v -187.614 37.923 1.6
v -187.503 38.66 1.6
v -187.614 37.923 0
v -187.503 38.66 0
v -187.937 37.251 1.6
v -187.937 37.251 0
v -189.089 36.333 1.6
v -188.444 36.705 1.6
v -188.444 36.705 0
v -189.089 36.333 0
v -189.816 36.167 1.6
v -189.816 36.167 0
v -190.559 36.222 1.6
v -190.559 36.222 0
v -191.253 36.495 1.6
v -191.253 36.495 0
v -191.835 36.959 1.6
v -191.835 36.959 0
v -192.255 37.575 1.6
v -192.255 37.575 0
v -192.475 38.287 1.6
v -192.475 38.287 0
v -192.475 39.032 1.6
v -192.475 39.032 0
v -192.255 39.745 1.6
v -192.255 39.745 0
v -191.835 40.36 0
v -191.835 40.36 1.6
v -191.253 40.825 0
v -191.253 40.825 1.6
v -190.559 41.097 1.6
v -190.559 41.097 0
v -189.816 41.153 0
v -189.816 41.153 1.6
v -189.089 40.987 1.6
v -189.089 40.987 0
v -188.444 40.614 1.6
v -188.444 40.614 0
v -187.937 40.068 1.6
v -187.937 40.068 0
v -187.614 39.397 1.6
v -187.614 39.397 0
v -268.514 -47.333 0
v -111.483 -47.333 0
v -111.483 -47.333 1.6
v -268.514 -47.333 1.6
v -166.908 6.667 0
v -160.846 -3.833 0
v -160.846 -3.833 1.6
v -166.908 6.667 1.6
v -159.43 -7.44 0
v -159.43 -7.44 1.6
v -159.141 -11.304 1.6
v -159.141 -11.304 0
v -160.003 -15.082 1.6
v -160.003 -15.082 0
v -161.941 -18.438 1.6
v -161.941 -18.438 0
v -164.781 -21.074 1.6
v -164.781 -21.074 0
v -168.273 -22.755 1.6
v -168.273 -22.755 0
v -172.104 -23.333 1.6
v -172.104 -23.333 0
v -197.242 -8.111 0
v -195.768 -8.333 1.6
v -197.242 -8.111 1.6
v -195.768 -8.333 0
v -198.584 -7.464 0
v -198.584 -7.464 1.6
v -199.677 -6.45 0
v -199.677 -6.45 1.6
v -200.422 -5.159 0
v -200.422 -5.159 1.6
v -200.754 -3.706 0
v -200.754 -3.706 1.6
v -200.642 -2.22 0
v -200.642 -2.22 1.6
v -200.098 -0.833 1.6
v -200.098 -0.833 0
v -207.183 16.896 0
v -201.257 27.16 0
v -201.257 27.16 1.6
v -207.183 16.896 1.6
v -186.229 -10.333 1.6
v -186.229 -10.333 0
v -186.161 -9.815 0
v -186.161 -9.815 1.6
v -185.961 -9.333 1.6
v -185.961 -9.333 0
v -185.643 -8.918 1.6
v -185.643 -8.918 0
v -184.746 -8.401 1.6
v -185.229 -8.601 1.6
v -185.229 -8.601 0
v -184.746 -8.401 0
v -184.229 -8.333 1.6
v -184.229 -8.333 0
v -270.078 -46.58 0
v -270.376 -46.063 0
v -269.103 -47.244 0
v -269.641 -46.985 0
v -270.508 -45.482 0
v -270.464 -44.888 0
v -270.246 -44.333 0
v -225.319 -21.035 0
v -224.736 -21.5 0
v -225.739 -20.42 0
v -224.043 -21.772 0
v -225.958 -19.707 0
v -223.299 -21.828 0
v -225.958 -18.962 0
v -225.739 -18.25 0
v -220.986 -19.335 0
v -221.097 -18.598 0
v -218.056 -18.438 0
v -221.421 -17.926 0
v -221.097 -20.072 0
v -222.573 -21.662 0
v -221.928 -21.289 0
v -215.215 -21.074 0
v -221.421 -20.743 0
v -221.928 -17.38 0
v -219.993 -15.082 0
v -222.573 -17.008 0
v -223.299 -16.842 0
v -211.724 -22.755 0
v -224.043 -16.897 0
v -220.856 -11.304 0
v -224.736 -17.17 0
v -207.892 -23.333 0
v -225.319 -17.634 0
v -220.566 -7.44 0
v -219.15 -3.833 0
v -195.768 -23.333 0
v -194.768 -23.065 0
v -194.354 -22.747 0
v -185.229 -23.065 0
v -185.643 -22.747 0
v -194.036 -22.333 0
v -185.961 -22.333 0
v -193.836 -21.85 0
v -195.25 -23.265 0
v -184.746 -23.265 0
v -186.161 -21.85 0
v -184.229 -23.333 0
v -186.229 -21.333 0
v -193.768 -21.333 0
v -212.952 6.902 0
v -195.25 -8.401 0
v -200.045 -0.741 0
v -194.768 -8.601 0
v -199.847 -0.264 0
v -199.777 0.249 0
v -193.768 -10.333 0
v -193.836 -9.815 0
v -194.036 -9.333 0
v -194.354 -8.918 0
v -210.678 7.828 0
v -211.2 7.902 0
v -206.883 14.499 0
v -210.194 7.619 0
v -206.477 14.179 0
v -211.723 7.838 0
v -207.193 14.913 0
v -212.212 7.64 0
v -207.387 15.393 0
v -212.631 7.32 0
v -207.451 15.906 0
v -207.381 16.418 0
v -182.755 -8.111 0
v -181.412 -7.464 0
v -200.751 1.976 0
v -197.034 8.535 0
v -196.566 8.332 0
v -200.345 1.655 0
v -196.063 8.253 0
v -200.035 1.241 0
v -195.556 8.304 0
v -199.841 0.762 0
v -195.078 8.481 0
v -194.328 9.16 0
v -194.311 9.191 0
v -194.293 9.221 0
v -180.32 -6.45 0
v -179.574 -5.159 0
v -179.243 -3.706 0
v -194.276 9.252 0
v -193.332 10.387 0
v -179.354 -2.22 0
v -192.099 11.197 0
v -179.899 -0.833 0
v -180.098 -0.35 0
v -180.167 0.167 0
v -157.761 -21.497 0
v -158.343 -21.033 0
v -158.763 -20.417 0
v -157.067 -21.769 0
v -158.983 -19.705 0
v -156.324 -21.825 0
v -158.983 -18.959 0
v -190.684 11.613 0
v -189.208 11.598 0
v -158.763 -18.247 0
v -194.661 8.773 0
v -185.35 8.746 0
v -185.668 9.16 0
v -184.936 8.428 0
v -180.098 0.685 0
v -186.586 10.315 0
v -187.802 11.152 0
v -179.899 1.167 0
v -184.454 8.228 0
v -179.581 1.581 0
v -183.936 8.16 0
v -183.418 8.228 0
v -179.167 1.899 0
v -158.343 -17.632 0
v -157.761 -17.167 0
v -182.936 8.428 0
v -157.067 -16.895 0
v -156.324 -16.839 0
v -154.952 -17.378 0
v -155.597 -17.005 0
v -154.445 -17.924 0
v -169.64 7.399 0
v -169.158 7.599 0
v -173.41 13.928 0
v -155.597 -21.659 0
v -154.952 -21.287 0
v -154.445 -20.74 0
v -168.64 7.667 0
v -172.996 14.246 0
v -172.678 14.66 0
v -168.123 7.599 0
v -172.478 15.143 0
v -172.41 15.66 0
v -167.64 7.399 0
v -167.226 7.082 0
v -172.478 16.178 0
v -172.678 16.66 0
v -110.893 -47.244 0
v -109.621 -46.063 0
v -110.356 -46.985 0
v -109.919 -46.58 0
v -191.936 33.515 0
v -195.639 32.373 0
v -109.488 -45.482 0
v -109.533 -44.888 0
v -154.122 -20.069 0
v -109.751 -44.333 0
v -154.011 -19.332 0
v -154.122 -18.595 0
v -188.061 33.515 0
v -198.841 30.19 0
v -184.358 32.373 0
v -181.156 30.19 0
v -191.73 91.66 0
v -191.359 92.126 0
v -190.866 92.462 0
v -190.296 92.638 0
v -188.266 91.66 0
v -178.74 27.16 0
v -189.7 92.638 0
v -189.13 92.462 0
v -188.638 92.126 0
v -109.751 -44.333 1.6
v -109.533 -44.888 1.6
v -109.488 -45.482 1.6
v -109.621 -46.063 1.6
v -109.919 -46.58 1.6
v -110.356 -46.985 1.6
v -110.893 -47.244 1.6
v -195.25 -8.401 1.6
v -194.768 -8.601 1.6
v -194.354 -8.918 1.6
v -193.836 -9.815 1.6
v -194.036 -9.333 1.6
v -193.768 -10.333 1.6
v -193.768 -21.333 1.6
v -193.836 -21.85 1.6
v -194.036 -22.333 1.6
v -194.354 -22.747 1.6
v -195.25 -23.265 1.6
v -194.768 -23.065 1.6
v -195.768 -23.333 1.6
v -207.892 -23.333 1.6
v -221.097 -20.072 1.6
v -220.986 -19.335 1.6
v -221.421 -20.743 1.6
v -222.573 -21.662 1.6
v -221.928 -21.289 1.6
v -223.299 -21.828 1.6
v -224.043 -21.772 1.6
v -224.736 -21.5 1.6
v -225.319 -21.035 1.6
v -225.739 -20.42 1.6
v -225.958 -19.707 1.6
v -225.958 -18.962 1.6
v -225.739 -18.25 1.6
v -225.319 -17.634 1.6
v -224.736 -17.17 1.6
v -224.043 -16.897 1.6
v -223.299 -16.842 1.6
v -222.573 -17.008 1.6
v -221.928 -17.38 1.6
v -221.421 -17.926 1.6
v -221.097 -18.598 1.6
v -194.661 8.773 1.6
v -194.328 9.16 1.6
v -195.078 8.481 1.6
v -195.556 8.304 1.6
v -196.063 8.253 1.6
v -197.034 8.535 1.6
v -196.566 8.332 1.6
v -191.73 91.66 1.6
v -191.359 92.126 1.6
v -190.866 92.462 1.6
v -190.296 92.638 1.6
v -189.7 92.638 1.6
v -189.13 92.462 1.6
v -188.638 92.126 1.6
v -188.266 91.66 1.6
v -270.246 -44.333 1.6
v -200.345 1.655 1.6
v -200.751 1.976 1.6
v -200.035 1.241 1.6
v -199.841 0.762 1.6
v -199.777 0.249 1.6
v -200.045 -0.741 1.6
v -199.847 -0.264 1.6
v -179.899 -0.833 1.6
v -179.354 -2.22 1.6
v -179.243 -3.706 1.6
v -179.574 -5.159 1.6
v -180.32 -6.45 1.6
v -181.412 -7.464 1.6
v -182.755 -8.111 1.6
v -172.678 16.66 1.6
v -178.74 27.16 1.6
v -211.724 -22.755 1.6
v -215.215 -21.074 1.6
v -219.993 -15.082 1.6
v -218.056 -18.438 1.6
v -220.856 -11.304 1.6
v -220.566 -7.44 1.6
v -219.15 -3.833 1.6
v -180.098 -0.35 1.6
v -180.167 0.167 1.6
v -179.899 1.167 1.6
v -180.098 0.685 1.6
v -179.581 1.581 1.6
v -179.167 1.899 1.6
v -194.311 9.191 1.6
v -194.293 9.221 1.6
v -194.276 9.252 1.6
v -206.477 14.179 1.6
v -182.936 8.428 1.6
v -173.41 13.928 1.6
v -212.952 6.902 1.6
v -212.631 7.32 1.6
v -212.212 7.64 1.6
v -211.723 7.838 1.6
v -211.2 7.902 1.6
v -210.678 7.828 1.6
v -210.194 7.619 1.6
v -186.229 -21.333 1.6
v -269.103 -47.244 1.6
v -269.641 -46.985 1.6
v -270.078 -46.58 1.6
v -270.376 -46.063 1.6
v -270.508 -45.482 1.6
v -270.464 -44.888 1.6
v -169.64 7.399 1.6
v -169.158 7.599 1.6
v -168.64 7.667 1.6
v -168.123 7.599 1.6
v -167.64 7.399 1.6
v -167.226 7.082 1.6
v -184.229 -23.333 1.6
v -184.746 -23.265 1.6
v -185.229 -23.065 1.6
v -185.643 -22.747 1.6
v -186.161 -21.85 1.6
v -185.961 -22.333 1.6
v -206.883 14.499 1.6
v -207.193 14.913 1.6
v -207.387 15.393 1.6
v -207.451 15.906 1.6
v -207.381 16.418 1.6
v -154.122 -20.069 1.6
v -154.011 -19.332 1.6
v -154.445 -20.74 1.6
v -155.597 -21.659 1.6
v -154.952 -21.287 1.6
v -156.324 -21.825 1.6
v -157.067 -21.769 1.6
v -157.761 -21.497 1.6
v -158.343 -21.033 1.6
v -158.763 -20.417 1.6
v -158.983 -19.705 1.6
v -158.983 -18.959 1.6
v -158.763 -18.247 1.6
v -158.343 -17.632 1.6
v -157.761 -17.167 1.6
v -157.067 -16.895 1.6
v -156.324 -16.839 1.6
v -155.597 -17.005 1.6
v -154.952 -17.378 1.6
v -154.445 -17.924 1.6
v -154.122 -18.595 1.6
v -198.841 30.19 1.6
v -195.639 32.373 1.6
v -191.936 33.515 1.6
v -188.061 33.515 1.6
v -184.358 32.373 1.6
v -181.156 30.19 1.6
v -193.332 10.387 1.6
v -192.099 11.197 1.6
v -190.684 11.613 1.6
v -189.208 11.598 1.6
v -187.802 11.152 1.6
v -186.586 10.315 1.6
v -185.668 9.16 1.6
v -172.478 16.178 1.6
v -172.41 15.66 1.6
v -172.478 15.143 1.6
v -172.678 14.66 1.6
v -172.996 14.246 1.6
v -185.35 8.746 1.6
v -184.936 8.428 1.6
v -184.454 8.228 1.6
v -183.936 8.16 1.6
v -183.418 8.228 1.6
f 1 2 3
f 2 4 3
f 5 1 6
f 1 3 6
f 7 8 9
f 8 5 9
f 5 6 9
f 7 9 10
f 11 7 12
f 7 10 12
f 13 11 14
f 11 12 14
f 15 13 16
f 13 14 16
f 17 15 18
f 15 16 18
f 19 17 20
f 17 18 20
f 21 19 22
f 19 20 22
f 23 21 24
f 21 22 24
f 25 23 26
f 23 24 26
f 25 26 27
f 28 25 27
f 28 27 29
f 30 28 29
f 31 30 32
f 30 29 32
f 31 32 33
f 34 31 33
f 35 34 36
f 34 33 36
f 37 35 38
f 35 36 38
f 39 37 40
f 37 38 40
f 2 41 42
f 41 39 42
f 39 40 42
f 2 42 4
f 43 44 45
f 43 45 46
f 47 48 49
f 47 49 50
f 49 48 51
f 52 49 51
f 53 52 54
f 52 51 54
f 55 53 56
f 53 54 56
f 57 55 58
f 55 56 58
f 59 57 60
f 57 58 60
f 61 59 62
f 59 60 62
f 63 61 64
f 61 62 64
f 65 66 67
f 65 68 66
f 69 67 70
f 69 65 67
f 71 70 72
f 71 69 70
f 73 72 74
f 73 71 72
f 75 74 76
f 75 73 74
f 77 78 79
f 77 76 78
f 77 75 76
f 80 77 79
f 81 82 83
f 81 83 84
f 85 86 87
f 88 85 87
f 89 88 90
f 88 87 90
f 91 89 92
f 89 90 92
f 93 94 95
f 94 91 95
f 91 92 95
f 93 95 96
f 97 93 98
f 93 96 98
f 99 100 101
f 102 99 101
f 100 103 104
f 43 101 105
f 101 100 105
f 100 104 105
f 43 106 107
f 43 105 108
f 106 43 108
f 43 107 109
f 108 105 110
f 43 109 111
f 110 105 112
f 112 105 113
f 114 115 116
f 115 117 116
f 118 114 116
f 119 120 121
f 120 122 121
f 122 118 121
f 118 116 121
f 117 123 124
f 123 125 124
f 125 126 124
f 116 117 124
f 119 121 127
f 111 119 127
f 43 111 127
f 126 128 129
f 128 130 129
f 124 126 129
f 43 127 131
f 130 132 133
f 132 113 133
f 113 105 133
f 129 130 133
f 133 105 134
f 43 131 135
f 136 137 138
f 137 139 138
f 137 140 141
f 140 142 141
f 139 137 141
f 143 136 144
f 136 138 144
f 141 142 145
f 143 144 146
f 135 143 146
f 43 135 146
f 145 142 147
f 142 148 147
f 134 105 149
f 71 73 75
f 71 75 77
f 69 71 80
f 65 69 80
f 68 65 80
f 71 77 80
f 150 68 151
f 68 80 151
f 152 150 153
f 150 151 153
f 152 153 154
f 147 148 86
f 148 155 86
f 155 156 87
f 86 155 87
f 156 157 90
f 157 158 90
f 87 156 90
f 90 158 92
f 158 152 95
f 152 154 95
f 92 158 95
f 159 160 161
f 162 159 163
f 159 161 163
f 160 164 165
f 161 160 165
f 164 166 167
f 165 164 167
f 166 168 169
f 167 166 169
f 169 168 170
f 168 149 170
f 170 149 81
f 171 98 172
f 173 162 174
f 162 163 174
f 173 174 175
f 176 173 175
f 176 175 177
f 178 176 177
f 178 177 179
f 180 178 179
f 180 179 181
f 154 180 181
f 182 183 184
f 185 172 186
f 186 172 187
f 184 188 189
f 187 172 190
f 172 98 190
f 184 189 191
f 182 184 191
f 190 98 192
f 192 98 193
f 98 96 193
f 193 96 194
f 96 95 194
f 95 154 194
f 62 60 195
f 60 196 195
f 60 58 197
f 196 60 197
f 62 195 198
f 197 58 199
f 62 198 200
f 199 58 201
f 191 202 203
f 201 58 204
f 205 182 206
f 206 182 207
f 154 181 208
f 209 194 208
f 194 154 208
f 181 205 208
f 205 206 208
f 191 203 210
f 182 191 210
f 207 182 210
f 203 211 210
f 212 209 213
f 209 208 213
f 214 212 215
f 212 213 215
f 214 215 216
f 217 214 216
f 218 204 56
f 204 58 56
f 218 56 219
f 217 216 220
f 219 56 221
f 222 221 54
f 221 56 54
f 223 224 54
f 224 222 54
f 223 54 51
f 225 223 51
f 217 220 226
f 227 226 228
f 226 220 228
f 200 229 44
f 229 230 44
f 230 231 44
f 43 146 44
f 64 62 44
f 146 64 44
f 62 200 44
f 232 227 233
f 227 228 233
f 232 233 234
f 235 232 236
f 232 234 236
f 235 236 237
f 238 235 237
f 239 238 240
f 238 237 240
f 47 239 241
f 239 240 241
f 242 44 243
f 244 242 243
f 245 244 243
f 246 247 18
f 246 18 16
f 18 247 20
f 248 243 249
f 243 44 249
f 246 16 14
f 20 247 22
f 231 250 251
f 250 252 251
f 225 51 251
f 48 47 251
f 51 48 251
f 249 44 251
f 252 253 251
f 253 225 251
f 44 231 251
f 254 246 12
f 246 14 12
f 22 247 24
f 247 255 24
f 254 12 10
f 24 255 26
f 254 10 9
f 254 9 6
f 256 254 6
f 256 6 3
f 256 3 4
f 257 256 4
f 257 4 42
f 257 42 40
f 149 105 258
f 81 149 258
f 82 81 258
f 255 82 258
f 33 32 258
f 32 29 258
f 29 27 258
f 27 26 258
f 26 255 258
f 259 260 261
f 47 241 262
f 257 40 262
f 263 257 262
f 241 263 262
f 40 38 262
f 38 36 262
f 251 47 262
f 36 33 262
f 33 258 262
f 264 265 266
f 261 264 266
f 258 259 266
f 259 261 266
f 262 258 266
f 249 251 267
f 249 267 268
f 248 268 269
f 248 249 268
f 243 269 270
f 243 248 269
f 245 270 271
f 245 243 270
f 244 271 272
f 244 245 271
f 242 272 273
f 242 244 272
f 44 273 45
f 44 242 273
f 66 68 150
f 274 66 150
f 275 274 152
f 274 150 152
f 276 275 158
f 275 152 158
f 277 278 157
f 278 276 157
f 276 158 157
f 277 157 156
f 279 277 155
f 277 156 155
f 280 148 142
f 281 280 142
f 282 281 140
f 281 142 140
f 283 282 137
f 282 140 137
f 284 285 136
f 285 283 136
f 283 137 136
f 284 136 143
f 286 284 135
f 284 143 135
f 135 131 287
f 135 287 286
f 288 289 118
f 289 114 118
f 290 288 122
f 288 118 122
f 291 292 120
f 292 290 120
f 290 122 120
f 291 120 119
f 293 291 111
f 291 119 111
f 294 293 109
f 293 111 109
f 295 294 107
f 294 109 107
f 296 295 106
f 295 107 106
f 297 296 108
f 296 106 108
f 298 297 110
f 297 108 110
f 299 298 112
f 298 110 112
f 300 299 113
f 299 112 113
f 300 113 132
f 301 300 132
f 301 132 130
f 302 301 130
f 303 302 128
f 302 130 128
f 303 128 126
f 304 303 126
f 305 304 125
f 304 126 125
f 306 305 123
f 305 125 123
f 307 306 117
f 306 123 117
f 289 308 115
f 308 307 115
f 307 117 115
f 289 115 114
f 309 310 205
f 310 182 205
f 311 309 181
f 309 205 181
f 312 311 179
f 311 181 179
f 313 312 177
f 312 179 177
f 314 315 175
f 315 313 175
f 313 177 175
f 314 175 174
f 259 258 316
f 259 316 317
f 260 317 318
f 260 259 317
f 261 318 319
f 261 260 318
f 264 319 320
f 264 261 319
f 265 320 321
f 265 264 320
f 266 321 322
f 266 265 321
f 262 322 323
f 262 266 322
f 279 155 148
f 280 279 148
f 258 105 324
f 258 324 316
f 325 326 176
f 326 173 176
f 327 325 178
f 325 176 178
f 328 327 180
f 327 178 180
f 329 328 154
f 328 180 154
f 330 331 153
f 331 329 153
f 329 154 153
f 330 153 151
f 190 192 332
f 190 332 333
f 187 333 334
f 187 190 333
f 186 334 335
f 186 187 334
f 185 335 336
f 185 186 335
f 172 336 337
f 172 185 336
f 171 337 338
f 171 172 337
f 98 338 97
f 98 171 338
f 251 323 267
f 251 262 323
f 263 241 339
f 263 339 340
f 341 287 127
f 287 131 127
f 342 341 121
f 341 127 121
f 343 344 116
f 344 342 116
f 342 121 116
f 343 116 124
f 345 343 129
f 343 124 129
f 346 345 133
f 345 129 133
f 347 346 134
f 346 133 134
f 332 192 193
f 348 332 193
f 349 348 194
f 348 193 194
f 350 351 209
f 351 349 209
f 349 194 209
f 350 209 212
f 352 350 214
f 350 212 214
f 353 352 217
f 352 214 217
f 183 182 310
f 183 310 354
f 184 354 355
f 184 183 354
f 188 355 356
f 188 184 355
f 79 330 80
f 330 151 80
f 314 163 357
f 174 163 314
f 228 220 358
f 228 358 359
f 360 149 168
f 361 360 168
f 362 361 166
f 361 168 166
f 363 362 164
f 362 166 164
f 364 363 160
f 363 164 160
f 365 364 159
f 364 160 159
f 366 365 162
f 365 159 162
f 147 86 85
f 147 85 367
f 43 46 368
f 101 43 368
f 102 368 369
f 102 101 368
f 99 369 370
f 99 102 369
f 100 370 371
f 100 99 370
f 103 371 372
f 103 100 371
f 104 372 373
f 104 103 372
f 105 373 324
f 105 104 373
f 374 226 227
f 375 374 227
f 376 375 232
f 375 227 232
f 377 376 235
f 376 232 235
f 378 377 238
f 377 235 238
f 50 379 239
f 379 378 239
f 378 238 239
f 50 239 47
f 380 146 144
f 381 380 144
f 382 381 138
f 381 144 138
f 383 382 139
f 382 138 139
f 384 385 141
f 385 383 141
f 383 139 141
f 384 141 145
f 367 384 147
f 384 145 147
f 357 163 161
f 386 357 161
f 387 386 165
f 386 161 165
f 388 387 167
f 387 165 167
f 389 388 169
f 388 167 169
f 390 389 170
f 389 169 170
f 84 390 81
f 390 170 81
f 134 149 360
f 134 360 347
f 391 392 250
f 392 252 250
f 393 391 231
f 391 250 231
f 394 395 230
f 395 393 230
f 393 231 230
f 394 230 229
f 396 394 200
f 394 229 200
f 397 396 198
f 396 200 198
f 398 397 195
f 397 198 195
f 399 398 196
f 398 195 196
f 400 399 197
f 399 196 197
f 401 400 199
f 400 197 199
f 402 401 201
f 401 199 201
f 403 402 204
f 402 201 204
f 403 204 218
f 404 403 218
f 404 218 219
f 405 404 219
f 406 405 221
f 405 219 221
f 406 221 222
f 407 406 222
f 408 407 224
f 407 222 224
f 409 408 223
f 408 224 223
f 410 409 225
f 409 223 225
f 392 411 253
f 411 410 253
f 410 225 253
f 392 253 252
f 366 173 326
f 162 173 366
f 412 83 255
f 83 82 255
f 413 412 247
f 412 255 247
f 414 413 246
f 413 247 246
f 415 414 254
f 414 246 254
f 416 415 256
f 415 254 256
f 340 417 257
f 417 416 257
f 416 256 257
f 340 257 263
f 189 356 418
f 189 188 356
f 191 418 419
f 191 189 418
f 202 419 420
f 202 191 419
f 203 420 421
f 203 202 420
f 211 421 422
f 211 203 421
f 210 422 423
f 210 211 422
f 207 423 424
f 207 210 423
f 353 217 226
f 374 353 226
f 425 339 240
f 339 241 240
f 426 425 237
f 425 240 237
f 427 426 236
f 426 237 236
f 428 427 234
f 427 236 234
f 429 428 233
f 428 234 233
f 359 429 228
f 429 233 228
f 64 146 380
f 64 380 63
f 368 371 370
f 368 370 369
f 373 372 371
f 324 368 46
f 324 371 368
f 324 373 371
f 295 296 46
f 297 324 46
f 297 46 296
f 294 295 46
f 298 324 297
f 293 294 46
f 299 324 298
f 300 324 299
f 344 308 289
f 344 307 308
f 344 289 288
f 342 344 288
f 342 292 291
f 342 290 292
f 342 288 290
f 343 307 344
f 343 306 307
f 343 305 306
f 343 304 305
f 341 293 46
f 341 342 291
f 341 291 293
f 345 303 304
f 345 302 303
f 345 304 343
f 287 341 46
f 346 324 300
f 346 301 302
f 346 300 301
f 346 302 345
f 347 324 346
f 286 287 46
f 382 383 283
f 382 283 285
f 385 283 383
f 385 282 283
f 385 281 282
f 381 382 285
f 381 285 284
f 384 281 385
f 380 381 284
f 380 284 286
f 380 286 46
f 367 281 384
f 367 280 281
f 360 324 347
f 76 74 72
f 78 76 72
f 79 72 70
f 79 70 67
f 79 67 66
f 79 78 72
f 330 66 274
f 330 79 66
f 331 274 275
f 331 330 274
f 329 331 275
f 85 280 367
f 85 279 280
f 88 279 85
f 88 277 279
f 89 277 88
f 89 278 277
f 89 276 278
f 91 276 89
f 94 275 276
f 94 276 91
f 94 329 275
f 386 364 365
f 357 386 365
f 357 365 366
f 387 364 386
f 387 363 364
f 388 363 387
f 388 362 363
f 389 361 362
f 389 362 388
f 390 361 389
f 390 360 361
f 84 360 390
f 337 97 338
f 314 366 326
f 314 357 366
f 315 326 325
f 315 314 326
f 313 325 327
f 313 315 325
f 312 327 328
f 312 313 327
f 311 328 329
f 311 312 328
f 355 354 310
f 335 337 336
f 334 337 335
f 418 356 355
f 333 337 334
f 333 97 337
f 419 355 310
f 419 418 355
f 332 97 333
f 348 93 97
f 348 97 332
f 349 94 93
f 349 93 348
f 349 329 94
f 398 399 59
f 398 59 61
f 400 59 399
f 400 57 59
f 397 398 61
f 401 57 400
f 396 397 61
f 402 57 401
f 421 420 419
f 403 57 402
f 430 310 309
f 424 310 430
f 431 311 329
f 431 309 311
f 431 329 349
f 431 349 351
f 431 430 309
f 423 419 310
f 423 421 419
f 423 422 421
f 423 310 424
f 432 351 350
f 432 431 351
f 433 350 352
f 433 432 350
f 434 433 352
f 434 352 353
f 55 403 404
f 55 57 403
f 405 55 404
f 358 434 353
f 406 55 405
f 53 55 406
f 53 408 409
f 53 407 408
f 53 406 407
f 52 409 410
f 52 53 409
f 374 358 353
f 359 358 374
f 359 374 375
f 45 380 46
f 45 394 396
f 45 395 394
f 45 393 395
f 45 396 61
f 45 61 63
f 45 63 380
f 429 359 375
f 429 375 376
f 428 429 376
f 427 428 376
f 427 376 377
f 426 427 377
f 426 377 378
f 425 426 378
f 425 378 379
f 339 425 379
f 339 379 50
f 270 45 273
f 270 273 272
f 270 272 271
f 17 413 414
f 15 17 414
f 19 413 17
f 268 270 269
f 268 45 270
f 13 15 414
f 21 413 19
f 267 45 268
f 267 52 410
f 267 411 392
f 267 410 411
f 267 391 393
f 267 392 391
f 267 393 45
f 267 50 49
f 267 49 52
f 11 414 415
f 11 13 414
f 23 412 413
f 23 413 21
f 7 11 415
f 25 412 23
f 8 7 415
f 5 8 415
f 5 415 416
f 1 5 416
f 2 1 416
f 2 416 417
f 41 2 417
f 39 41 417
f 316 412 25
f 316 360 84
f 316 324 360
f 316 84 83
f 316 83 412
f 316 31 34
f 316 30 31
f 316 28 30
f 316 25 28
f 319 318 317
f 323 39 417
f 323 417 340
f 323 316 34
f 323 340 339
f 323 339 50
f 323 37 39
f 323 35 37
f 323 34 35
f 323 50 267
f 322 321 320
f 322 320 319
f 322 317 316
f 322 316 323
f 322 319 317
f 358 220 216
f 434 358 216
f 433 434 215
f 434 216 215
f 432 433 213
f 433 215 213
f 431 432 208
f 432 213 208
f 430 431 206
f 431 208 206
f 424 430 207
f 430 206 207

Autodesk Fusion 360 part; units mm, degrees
sketch "Sketch1" plane through (0, 0, 0) normal (0, 0, 1) x (1, 0, 0)
  circle A0 centre (-190.0028, 38.6598) radius 2.5
  circle A1 centre (-223.4863, -19.3348) radius 2.5
  circle A2 centre (-156.5107, -19.3321) radius 2.5
  line L0 (-270.2459, -44.3327) -> (-191.7303, 91.6603)
  line L1 (-188.2662, 91.6603) -> (-109.7506, -44.3327)
  line L2 (-111.4826, -47.3327) -> (-268.5139, -47.3327)
  line L3 (-274.0245, -46.8774) -> (-272.6069, -49.3327)
  line L4 (-274.0245, -46.8774) -> (-191.4162, 96.2043)
  line L5 (-188.5801, 96.204) -> (-191.4221, 96.204)
  line L6 (-107.3967, -49.3327) -> (-105.9755, -46.8713)
  line L7 (-107.3967, -49.3327) -> (-272.6069, -49.3327)
  line L8 (-188.5801, 96.204) -> (-105.9755, -46.8713)
  arc A3 (-270.2459, -44.3327) -> (-268.5139, -47.3327) centre (-268.5139, -45.3327) ccw
  arc A4 (-188.2662, 91.6603) -> (-191.7303, 91.6603) centre (-189.9983, 90.6603) ccw
  arc A5 (-111.4826, -47.3327) -> (-109.7506, -44.3327) centre (-111.4826, -45.3327) ccw
  arc A6 (-219.1504, -3.8327) -> (-207.8921, -23.3327) centre (-207.8921, -10.3327) ccw
  arc A7 (-178.7399, 27.1603) -> (-201.2566, 27.1603) centre (-189.9983, 20.6603) ccw
  arc A8 (-172.1044, -23.3327) -> (-160.8461, -3.8327) centre (-172.1044, -10.3327) ccw
  arc A9 (-185.6681, 9.1603) -> (-194.3284, 9.1603) centre (-189.9983, 6.6603) ccw
  arc A10 (-200.0979, -0.8327) -> (-195.7678, -8.3327) centre (-195.7678, -3.3327) ccw
  arc A11 (-184.2287, -8.3327) -> (-179.8986, -0.8327) centre (-184.2287, -3.3327) ccw
  line L9 (-182.9361, 8.4283) -> (-173.4098, 13.9283)
  line L10 (-179.1666, 1.8993) -> (-169.6403, 7.3993)
  line L11 (-206.4769, 14.1788) -> (-197.0336, 8.5351)
  line L12 (-200.7511, 1.9755) -> (-210.1943, 7.6193)
  line L13 (-186.2287, -10.3327) -> (-186.2287, -21.3327)
  line L14 (-193.7678, -10.3327) -> (-193.7678, -21.3327)
  line L15 (-194.3284, 9.1603) -> (-194.2756, 9.2518)
  line L16 (-200.0451, -0.7412) -> (-200.0979, -0.8327)
  line L17 (-207.8921, -23.3327) -> (-195.7678, -23.3327)
  line L18 (-184.2287, -23.3327) -> (-172.1044, -23.3327)
  line L19 (-201.2566, 27.1603) -> (-207.1829, 16.8956)
  line L20 (-212.9524, 6.9025) -> (-219.1504, -3.8327)
  line L21 (-160.8461, -3.8327) -> (-166.9082, 6.6673)
  line L22 (-172.6777, 16.6603) -> (-178.7399, 27.1603)
  arc A12 (-185.6681, 9.1603) -> (-182.9361, 8.4283) centre (-183.9361, 10.1603) ccw
  arc A13 (-173.4098, 13.9283) -> (-172.6777, 16.6603) centre (-174.4098, 15.6603) ccw
  arc A14 (-166.9082, 6.6673) -> (-169.6403, 7.3993) centre (-168.6403, 5.6673) ccw
  arc A15 (-179.1666, 1.8993) -> (-179.8986, -0.8327) centre (-178.1666, 0.1673) ccw
  arc A16 (-184.2287, -8.3327) -> (-186.2287, -10.3327) centre (-184.2287, -10.3327) ccw
  arc A17 (-193.7678, -10.3327) -> (-195.7678, -8.3327) centre (-195.7678, -10.3327) ccw
  arc A18 (-200.0451, -0.7412) -> (-200.7511, 1.9755) centre (-201.7771, 0.2588) ccw
  arc A19 (-197.0336, 8.5351) -> (-194.2756, 9.2518) centre (-196.0076, 10.2518) ccw
  arc A20 (-207.1829, 16.8956) -> (-206.4769, 14.1788) centre (-205.4509, 15.8956) ccw
  arc A21 (-210.1943, 7.6193) -> (-212.9524, 6.9025) centre (-211.2204, 5.9025) ccw
  arc A22 (-195.7678, -23.3327) -> (-193.7678, -21.3327) centre (-195.7678, -21.3327) ccw
  arc A23 (-186.2287, -21.3327) -> (-184.2287, -23.3327) centre (-184.2287, -21.3327) ccw
  dimension "d1" = 5
  dimension "d2" = 5
  dimension "d3" = 5
  dimension "d5" = 120
  dimension "d11" = 2.842
  dimension "d12" = 120
  dimension "d13" = 60
  dimension "d16" = 120
  dimension "d17" = 120
  dimension "d18" = 120
  dimension "d19" = 2
  dimension "d20" = 2
  dimension "d21" = 2
  dimension "d22" = 2
  dimension "d23" = 60
  dimension "d24" = 60
  dimension "d25" = 24
  dimension "d26" = 24
  dimension "d27" = 24
  dimension "d28" = 13
  dimension "d32" = 5
  dimension "d34" = 2
  dimension "d35" = 2
  dimension "d36" = 2
  dimension "d37" = 2
  dimension "d38" = 2
  dimension "d39" = 2
  dimension "d40" = 2
  dimension "d41" = 2
extrude "Extrude1" add sketch "Sketch1" along normal blind 1.6 contours L0 L1 L2 A3 A4 A5
